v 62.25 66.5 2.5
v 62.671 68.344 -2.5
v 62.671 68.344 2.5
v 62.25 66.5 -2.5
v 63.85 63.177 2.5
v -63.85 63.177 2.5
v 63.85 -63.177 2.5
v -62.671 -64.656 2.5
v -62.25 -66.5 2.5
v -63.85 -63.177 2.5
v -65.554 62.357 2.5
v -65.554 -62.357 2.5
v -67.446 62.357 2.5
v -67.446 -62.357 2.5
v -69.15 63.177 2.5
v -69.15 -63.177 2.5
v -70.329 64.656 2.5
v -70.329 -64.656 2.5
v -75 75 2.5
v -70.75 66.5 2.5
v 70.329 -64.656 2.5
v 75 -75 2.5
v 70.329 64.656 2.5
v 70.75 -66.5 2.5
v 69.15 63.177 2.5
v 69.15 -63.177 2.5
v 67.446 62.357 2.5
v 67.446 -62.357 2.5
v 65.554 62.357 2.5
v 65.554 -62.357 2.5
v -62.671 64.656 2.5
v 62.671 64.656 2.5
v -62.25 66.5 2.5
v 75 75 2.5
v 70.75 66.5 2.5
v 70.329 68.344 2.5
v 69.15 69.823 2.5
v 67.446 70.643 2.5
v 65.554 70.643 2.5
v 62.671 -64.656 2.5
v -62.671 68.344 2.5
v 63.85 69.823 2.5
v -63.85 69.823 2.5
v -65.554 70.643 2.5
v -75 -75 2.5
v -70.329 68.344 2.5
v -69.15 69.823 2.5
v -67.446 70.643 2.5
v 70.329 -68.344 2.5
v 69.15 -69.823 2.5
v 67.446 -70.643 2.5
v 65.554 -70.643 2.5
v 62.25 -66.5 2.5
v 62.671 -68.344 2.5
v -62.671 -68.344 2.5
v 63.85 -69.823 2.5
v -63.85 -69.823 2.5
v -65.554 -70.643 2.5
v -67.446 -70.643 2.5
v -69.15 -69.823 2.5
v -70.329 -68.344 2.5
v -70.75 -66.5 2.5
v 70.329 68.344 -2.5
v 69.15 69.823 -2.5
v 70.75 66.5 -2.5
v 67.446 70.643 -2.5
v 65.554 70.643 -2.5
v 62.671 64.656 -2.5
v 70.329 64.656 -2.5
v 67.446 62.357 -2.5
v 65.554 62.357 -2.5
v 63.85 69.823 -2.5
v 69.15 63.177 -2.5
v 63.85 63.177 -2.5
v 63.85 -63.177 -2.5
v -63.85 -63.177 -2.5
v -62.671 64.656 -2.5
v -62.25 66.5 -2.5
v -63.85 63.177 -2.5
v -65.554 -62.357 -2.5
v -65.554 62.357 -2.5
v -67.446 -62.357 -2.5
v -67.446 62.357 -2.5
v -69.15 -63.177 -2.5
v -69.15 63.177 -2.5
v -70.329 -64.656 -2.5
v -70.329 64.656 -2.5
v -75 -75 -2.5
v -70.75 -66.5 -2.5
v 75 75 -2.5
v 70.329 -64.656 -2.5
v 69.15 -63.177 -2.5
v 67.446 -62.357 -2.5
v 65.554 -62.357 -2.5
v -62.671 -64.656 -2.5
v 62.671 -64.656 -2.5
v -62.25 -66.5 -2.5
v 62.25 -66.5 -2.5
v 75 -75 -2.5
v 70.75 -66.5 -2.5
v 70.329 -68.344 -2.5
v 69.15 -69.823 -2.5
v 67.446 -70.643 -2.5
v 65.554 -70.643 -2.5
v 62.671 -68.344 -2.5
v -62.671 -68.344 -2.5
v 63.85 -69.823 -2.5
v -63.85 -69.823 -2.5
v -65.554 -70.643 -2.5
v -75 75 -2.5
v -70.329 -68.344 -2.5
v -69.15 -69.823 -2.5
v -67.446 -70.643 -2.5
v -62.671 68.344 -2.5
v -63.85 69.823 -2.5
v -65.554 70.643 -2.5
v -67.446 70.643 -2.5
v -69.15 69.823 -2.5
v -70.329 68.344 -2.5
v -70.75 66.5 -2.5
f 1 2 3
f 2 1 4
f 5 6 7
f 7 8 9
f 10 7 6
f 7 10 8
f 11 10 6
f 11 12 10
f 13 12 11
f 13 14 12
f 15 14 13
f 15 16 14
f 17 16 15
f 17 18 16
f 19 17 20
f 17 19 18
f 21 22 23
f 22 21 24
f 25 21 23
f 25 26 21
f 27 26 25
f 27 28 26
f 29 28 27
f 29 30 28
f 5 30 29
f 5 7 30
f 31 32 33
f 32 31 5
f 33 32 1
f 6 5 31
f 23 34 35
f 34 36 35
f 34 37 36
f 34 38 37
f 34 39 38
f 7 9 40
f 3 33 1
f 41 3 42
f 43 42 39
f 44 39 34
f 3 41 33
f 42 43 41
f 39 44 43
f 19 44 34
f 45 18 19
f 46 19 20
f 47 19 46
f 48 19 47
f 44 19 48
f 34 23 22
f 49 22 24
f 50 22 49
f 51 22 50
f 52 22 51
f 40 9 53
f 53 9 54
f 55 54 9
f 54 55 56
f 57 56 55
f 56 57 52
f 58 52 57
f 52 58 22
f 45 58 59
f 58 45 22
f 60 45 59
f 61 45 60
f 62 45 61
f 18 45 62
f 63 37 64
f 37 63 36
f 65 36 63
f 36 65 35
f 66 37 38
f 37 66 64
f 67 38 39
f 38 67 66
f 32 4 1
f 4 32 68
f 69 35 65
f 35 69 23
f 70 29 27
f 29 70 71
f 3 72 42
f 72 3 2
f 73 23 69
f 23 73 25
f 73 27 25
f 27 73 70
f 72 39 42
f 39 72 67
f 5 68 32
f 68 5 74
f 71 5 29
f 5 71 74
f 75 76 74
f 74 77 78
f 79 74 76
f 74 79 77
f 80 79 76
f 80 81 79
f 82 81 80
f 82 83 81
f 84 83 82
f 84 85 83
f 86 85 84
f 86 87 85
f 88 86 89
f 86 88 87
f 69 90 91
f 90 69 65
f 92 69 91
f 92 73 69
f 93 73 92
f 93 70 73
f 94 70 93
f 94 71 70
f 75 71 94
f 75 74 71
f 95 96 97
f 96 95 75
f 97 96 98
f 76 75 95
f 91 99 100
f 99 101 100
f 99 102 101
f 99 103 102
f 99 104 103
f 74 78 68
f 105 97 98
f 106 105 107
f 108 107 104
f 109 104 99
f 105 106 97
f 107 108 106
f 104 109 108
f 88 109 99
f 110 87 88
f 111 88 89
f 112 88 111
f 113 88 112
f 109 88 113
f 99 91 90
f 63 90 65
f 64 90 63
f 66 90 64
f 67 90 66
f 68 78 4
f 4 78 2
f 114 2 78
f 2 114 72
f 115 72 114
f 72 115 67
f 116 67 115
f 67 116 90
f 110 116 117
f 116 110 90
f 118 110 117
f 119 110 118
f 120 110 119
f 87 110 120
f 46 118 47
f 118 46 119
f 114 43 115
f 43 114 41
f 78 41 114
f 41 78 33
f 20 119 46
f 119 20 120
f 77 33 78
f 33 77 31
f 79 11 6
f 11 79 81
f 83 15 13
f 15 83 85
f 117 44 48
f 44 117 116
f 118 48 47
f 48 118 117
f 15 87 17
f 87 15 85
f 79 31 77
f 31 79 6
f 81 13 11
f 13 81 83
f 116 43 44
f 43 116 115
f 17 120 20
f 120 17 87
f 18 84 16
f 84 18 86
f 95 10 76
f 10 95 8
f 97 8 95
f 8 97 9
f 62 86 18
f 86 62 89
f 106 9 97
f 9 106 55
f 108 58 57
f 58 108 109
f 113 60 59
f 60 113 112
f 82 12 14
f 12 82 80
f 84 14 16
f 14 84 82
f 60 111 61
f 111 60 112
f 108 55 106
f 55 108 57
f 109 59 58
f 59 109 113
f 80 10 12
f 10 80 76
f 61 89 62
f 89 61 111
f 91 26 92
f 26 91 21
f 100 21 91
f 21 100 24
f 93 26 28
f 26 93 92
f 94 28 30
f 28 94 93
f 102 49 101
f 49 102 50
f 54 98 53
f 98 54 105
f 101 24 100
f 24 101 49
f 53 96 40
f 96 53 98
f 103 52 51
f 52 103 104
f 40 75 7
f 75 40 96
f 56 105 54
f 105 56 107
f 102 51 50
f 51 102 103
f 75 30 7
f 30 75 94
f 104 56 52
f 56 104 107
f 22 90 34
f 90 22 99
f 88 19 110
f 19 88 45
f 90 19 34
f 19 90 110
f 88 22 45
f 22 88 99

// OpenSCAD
// Generated by SolidPython 1.1.3 on 2023-10-16 12:13:29


difference() {
	cube(center = true, size = [150, 150, 5]);
	union() {
		translate(v = [66.5000000000, 66.5000000000]) {
			cylinder(center = true, h = 5, r = 4.2500000000);
		}
		translate(v = [-66.5000000000, 66.5000000000]) {
			cylinder(center = true, h = 5, r = 4.2500000000);
		}
		translate(v = [-66.5000000000, -66.5000000000]) {
			cylinder(center = true, h = 5, r = 4.2500000000);
		}
		translate(v = [66.5000000000, -66.5000000000]) {
			cylinder(center = true, h = 5, r = 4.2500000000);
		}
	}
}
/***********************************************
*********      SolidPython code:      **********
************************************************
 
import solid
import numbers
import pudb
from solid.utils import *
import viewscad
import subprocess
import os
import os.path as osp
import math
import sys

chamfer_extrude=solid.import_scad("./chamfer_extrude.scad")
chamfer_extrude=chamfer_extrude.chamfer_extrude
r = viewscad.Renderer(width=800, height=800)

def debug(model,f_name,path="/home/ts/code/projects/mfd/designs/debug"):
    solid.scad_render_to_file(model,osp.join(path,f_name)+".scad")
#generate position list of wells using offset from center
wells_pos_from_center_4 = lambda offset: [[-offset,offset],
                                        [offset, offset],
                                        [-offset, -offset],
                                        [offset, -offset]]
#wells_pos_from_center_2 = lambda offset: [[0,offset],
#                                        [0, -offset]]
wells_pos_from_center_2 = lambda offset: [[offset,0],
                                        [-offset,0]]

def make_well(dims,shape=None,height=None,dxf=False):
    def circle_cylinder():
        if dxf or (height is None):
            well = solid.circle(r=dims, segments=64)
        else:
            well = solid.cylinder(r=dims, h=height, segments=64, center = True)
        return well
    if dims is None:
        sys.exit("radius needs to be a number")
    if isinstance(dims, numbers.Number):
        well =circle_cylinder()
    elif len(dims)==1:
        if isinstance(dims[1], numbers.Number):
            well =circle_cylinder()
        else:
            sys.exit("radius needs to be a number")
    elif len(dims)==2:
        well = solid.square(dims,center = True)
    elif len(dims)==3:
        well = solid.cube(dims, center = True)
    return well

def wells_top_bottom(center_gap,device_dims=None,shape=None,height=None, positions = None, dxf = False):
    well_shape = make_well(device_dims,shape=shape,height=height,dxf=dxf)
    wells = []
    if positions is None:
        offset = radius+radius/2.0
        positions = wells_pos_from_center_2(offset)
    if dxf or (height is None):
        height = 0
    for position in positions:
        if dxf:
            wells.append(solid.translate([position[0],position[1]])(well_shape))
        else:
            wells.append(solid.translate([position[0],position[1],height/2.0])(well_shape))
    return  union()(*wells)

#place wells in four corners 
def four_corner(radius,height=None, positions = None, dxf = False):
    #if well pos not specified set
    #to equally spaced by half radius
    if positions is None:
        offset = radius+radius/2.0
        positions = wells_pos_from_center_4(offset)
    if dxf or (height is None):
        height = 0
    #make wells at positions with specified radius and height
    wells = []
    for position in positions:
        #make circle if making dxf
        if dxf:
            well_shape = solid.circle(r=radius, segments=64)
            well_shape = solid.translate([position[0],position[1]])(well_shape)
        #if stl make cylinder
        else:
            well_shape = solid.cylinder(r=radius, h=height, segments=64, center = True)
            well_shape = solid.translate([position[0],position[1],height/2.0])(well_shape)
        wells.append(well_shape)
    return  union()(*wells)

#generate channels 
def make_channels(length,width,height=0,num_chans=1,max_chans=None,spacing=None, dxf = False,
                  rotate_channels=False):
    if dxf or (height is None):
        height = 0
    #if channel gap not defined, is equal to
    if spacing is None: spacing = width
    #calculate number of channels if fitting max num within given width
    if not max_chans is None:
        import math
        num_chans = math.floor((max_chans-spacing)/(width+spacing))
    #get total width of channel section  
    total_width = (width*num_chans)+(spacing*(num_chans-1))

    #make template channel
    #if rotate_channels: width, length = length, width
    if dxf:
        channel_t = solid.square([length,width],center = True)
    else:
        channel_t = solid.cube([length,width,height], center = True)

    #if number channels is even, offset the first channel to center its gap
    if num_chans % 2 == 0: centering = -(width/2.0+spacing/2.0)
    else: centering = 0
    #move template channel up to align bottom at z = 0 
    #and offset center if necessary
    if dxf:
        channel_t = solid.translate([0,centering])(channel_t)
    else:
        channel_t = solid.translate([0,centering,height/2.0])(channel_t)

    #if rotate_channels: length,width = width,length
    #start making the channels
    channels = []
    for i in range(num_chans):
        #if i=0 there is no translation
        #if i=1, we make the first channel adjacent to second
        direction = i

        #if i>=1, we add channels alternating left and right
        if i >= 1:
            direction = -(i/2.0)
            if i % 2 == 1: direction = (-direction)+0.5
                
        #make channel at right position and add it to channel list
        translation_coords = [0,direction*(width+spacing)]
        #if rotate_channels: translation_coords = [direction*(width+spacing),0]
        if dxf:
            channel = solid.translate(translation_coords)(channel_t)
        else:
            channel = solid.translate([*translation_coords,0])(channel_t)
        channels.append(channel)
    
    #group all channels as one object
    channels = union()(*channels)
    #compute the x,y,z dimensions in order to pass as arguments 
    #for construction of other parts of device (such as the chambers)
    measurements = {'x':(length/2.0,-length/2.0),
                    'y':(total_width/2.0,-total_width/2.0)}
    if not dxf:
        measurements['z'] = (height,0)
    if rotate_channels:
        channels = solid.rotate(90)(channels)
        measurements['x'],measurements['y']=measurements['y'],measurements['x']
    return channels,measurements

def make_chambers(msrs,height=None,extra=0,len_until=None,width=None, dxf = False):
    #computes x,y,z length
    total = lambda x : abs(x[0]) + abs(x[1])
    
    #if specific height if specified
    #otherwise use same height as channels
    if dxf:
        pass
    elif not height is None:
        msrs['z'] = (height,0)
    else:
        msrs['z'] = (0,0)
        
    #make copy of measurements from channels to modify chamber dimensions 
    #and add length to chambers as specified
    chamber_dims = msrs.copy()
    #calculate length of chamber to reach specified offset
    if not len_until is None:
        chamber_len = len_until-(msrs['x'][0])
    #or add specified length to channel length (if not specified, adds 0)
    else:
        chamber_len = msrs['x'][0]+extra
    #set the chamber length based 
    chamber_dims['x'] = (chamber_len/2.0,-(chamber_len/2.0))
    #compute final dimensions of chamber
    if not width is None:
        chamber_dims['y'] = (width/2.0,-width/2.0)
    chamber_dims = [total(size) for size in chamber_dims.values()]
        
    #calculate chamber translation offset to place adjacent to channels
    chamber_trslt = msrs['x'][0]+(chamber_len/2.0)
    #compute chamber translation coordinates to align with channels
    #x = 1 moves chamber above channels
    #x = -1 moves chamber below channels
    if dxf:
        trslt = lambda x : [x*(chamber_trslt),0]
    else:
        trslt = lambda x : [x*(chamber_trslt),0,msrs['z'][0]/2.0]
    
    #function to make chamber at top or at bottom 
    if dxf:
        move = lambda x : solid.translate(trslt(x))(solid.square(chamber_dims, center = True) )
    else:
        move = lambda x : solid.translate(trslt(x))(solid.cube(chamber_dims,center = True))
    #make top and bottom chambers and return them as grouped
    top = move(1)
    bottom = move(-1)
    #chambers=solid.rotate(90)(solid.union()(top,bottom))
    chambers=(solid.union()(top,bottom))

    return chambers

#create alignment features 
def alignment_features(unit,dims,grid_size, mask_size = None, alignment = "hollow", units_from_center = (2.5,2.5), corner_len=None):
    width = grid_size[0]*dims[0]
    length = grid_size[1]*dims[1]
    if mask_size is None and corner_len is None:
        corner_len = (dims[0] + dims[1]) /2 / 8
    corner = lambda thickness_div : solid.union()( solid.square([corner_len,corner_len/thickness_div],center=False), solid.square([corner_len/thickness_div,corner_len],center=False) )
    
    def make_full(thickness_div):
        thickness = corner_len/thickness_div
        tr = solid.translate([0, 0, 0 ])(solid.rotate(180)(corner(thickness_div)))
        tr = solid.translate([thickness/2,thickness/2,0])(tr)
        bl = solid.translate([0, 0, 0 ])(solid.rotate(0)(corner(thickness_div)))
        bl = solid.translate([-thickness/2,-thickness/2,0])(bl)
        return solid.union()(tr,bl)
    
    def make_hollow(thickness_div):
        thickness = corner_len/(thickness_div/2)
        inner = make_full(thickness_div)
        outer = make_full(thickness_div/2)
        hollow = outer - inner 
        return hollow
    
    center = (width /2 , length/2)
    mask_pos = lambda x,y : (center[0] + x*(float(units_from_center[0])*dims[0]), center[1] + y*(float(units_from_center[1])*dims[1]))
    positions = []
    positions.append(mask_pos(1,0))
    positions.append(mask_pos(0,1))
    positions.append(mask_pos(-1,0))
    positions.append(mask_pos(0,-1))
    make_mask = lambda mtype : make_hollow(8) if mtype == "hollow" else make_full(8)
    masks = [ solid.translate([*position,0])(make_mask(alignment)) for position in positions]
    
    solid.scad_render_to_file(solid.union()(*masks),"./designs/open_chamber/masks.scad")
    #return unit - solid.union()(*masks)
    return solid.union()(*masks,unit)

def create_outline(thickness, array, dims, grid_size,):
    width = grid_size[0]*dims[0] + thickness *2
    length = grid_size[1]*dims[1] + thickness *2
    outer = solid.translate([-thickness, -thickness,0])(solid.square([width, length]))
    return outer-array

def create_wall(wall_thickness, outline_thickness, dims, grid_size, wall_height = 2000, dxf = False):
    inner_width = grid_size[0]*dims[0] + outline_thickness *2
    inner_length = grid_size[1]*dims[1] + outline_thickness *2
    outer_width = inner_width + wall_thickness * 2
    outer_length = inner_length + wall_thickness * 2
    outer_pos_x = -outline_thickness-wall_thickness
    outer_pos_y = -outline_thickness-wall_thickness
    inner_pos_x = -outline_thickness
    inner_pos_y = -outline_thickness
    if dxf:
        inner_wall = solid.translate([inner_pos_x,
                                      inner_pos_y,
                                      0])(solid.square([inner_width, inner_length]))
        outer_wall = solid.translate([outer_pos_x,
                                      outer_pos_y,
                                      0])(solid.square([outer_width, outer_length]))

        return outer_wall-inner_wall
    else:
        inner_wall = solid.translate([inner_pos_x,
                                      inner_pos_y,
                                      0])(solid.cube([inner_width, inner_length,wall_height]))
        outer_wall = solid.translate([outer_pos_x,
                                      outer_pos_y,
                                      0])(solid.cube([outer_width, outer_length,wall_height]))

        return outer_wall-inner_wall, {'wall_height': wall_height,
                                       'wall_thickness': wall_thickness,
                                       'inner_width':inner_width,
                                       'inner_length': inner_length,
                                       'outer_width': outer_width,
                                       'outer_length': outer_length,
                                       'outer_pos_x' : outer_pos_x,
                                       'outer_pos_y' : outer_pos_y,
                                       'inner_pos_x' : inner_pos_x,
                                       'inner_pos_y' : inner_pos_y}

def create_thicker_wall(wall_thickness, outer_wall_offset, wall_dims, dims, grid_size, height_start = .2, height_end=2, dxf = False):
    addon_wall,thicker_wall_dims = create_wall(wall_thickness, outer_wall_offset, dims, grid_size, wall_height=height_end-height_start, dxf = False)
    addon_wall = solid.translate([0,0,height_start])(addon_wall)

    thicker_wall_dims['wall_height'] = height_end
    thicker_wall_dims['wall_thickness'] = wall_dims['wall_thickness'] + wall_thickness
    return addon_wall, thicker_wall_dims
 
def add_lock_to_wall(wall,wall_dims,y_offset = 0,cut_ratio=0.7,L_length=3, gap_ratio=0.05, axis="x",width_ratio=1/2):
    # Makes L shape
    def make_L(max_length,length_thickness,max_width,width_thickness,height,y_offset):
        length = solid.cube([max_length,length_thickness,height])
        width = solid.cube([width_thickness,max_width,height])
        width = solid.translate([max_length-(width_thickness),0,0])(width)
        L = solid.union()(width,length)
        debug(L,"L")
        if axis == "x":
            L = solid.rotate(-90)(L)
            L = solid.translate([0,max_length,0])(L)
        else:
            L = solid.rotate(-180)(L)
            L = solid.translate([max_length,max_width,0])(L)
        return solid.translate([0,0,y_offset])(L)
    
    lock_length = L_length
    lock_width = wall_dims['wall_thickness']*width_ratio
    lock_length_thickness = lock_width/2
    lock_width_thickness = lock_width/2
    L_lock = make_L(lock_length,lock_length_thickness,lock_width,lock_width_thickness, wall_dims['wall_height']-y_offset, y_offset)
    
    margin_space = lock_length - lock_length*(1-gap_ratio)
    key_length = lock_length-margin_space
    key_length_thickness = lock_length_thickness-(margin_space*2)
    key_width = lock_width-(margin_space*2)
    key_width_thickness = lock_width_thickness-(margin_space*2)
    L_key = make_L(key_length,key_length_thickness,key_width,key_width_thickness, wall_dims['wall_height']-y_offset, y_offset)
    L_key = solid.translate([margin_space,margin_space,0])(L_key)
    L = solid.union()(L_lock,L_key)
    debug(L,"L")
    
    #Make cube to be used as negative to split frame in a half
    #Can choose if making left or right negative, specify ratio of split
    def make_negative(right,cut_ratio):
        if axis == "x":
            if right:
                length = wall_dims['outer_length']*(1-cut_ratio)
                pos_x = wall_dims['outer_pos_x']+(wall_dims['outer_length']*cut_ratio)
            else:
                length = wall_dims['outer_length']*(cut_ratio)
                pos_x = wall_dims['outer_pos_x'] 
            negative = solid.cube([wall_dims['outer_width'],length, wall_dims['wall_height']])
            negative = solid.translate([wall_dims['outer_pos_y'],pos_x,0])(negative)
        else:
            if right:
                length = wall_dims['outer_width']*(1-cut_ratio)
                pos_x = wall_dims['outer_pos_y']+(wall_dims['outer_width']*cut_ratio)
            else:
                length = wall_dims['outer_width']*(cut_ratio)
                pos_x = wall_dims['outer_pos_y'] 
            negative = solid.cube([length,wall_dims['outer_length'], wall_dims['wall_height']])
            negative = solid.translate([pos_x,wall_dims['outer_pos_x'],0])(negative)
        return negative, pos_x, length 
                      
    #Make negatives
    negative_right, right_half_pos_x, right_half_length = make_negative(True,cut_ratio)
    negative_left, left_half_pos_x, right_half_length = make_negative(False,cut_ratio)
    #Make halves
    left_half = solid.difference()(wall,negative_right)
    right_half = solid.difference()(wall,negative_left)
    def place_L(L, L_length,L_width):
        #Place L on top wall       
        offset_to_center = (wall_dims['wall_thickness']-L_width)/2
        if axis == "x":
            y_pos_top = (wall_dims['outer_pos_y'] +
                    wall_dims['outer_width'] - 
                    L_width - offset_to_center)
            top_L = solid.translate([y_pos_top,
                                     right_half_pos_x-(L_length),
                                     0])(L)
            #Place L on bottom wall       
            y_pos_bottom = wall_dims['outer_pos_y']+offset_to_center
            bottom_L = solid.translate([y_pos_bottom,
                                        right_half_pos_x-L_length,
                                        0])(L)
        else:
            y_pos_top = (wall_dims['outer_pos_x'] +
                    wall_dims['outer_length'] -
                    (L_width+offset_to_center))
            top_L = solid.translate([right_half_pos_x-L_length,
                                     y_pos_top,
                                     0])(L)
            #Place L on bottom wall       
            y_pos_bottom = wall_dims['outer_pos_y']+offset_to_center
            bottom_L = solid.translate([right_half_pos_x-L_length,
                                        y_pos_bottom,
                                        0])(L)
        return bottom_L, top_L
    #Make complimentary L pieces through union and differences
    #Make Lock
    bottom_L_lock, top_L_lock = place_L(L_lock,L_length,lock_width)
    left_half = solid.difference()(left_half,bottom_L_lock)
    left_half = solid.difference()(left_half,top_L_lock)
    #Make Key
    bottom_L_key, top_L_key = place_L(L_key,L_length,lock_width)
    right_half = solid.union()(right_half,bottom_L_key)
    right_half = solid.union()(right_half,top_L_key)
    return left_half, right_half


#build a row x col grid of containment units
def make_unit_array(unit,dims,grid_size, dxf = False, alignment = None, mask_size = None,
                    units_from_center = None,alignment_offset=None, alignment_mark_size=1):
    units = []
    for col in range(grid_size[1]):
        for row in range(grid_size[0]):
            if dxf:
                units.append(solid.translate([row*dims[0],col*dims[1]])(unit))
            else:
                units.append(solid.translate([row*dims[0],col*dims[1],dims[2]/2.0])(unit))
    array = solid.union()(*units)
    if (not alignment is None) and dxf:
        if not alignment_offset is None:
            array = solid.translate([alignment_offset[0],alignment_offset[1]])(array)
        array = alignment_features(array,dims, grid_size, alignment = alignment, mask_size = None, units_from_center = units_from_center,corner_len=alignment_mark_size)
        if not alignment_offset is None:
            array = solid.translate([-alignment_offset[0],-alignment_offset[1]])(array)
    return array


def make_taylor(wells_pos = wells_pos_from_center_4(2.25), well_rad = 1.5 ,
                well_height = 2, chan_w = 0.01, chan_l = 1, chan_h = 0.010 ,
                chan_gap = 0.040, max_chans = None,num_chans=100, chamber_height  = 0.100,
                columns = 1, rows = 1, chamber_len_until=2.25, add_channels = True, add_wells = True, 
                add_chambers = True, save_path = "./", alignment = None, units_from_center = 2,
                mask_size = None, render_stl = False, outline_thickness = 0.050, dxf = True,
                wall_height = 15, wall_thickness = 0.95, casing_x=9, casing_y=9, casing_z=0,rotate_units=0):

    dims = [casing_x, casing_y, casing_z]
    wells = four_corner(well_rad,well_height, dxf = dxf, positions = wells_pos)
    debug(wells,"wells")
    channels, msrs = make_channels(chan_l,chan_w,chan_h,dxf=dxf, spacing = chan_gap, max_chans=max_chans,num_chans=num_chans)
    debug(channels,"channels")
    chambers = make_chambers(msrs,dxf = dxf, height=chamber_height,len_until=chamber_len_until)
    debug(chambers,"chambers")

    #add together and render
    device_parts = []
    if add_channels:
        device_parts.append(channels)
    if add_wells:
        device_parts.append(wells)
    if add_chambers:
        device_parts.append(chambers)
    device=union()(*device_parts)
    device = rotate(rotate_units)(device)

    device=solid.translate([dims[0]/2.0,dims[1]/2.0,0])(device)
    channels = rotate(rotate_units)(channels)
    channels=solid.translate([dims[0]/2,dims[1]/2,0])(channels)
    chambers_wells = union()(wells,chambers)
    chambers_wells = rotate(rotate_units)(chambers_wells)
    chambers_wells=solid.translate([dims[0]/2,dims[1]/2,0])(chambers_wells)

    file_name = str(rows)+'x'+str(columns)+'_units_'
    grid_size = [rows,columns]

    if alignment:
        alignment="full"
    device = make_unit_array(device,dims,grid_size, dxf=dxf, alignment = alignment,
                                 units_from_center = units_from_center)
    channels = make_unit_array(channels,dims,grid_size, dxf=dxf, alignment = alignment,
                                 units_from_center = units_from_center)
    if alignment=="full":
        alignment="hollow"

    chambers_wells = make_unit_array(chambers_wells,dims,grid_size, dxf=dxf, alignment = alignment,
                                 units_from_center =units_from_center)

    def save_model(model,prefix):
        model_fname = os.path.abspath(save_path+prefix+"_"+file_name+".scad")
        solid.scad_render_to_file(model,model_fname)
        return model_fname

    wells_fname = save_model(wells,"wells")
    channels_fname = save_model(channels,"channels")
    device_fname = save_model(device,"device")
    chambers_wells_fname = save_model(chambers_wells,"chambers_wells")
    return (chambers_wells,chambers_wells_fname), (channels,channels_fname), (device,device_fname)

def make_device(design='open',rows=8,columns=6,wells_pos = 4.5,well_offset=3.2, well_rad=3.2,well_height=0.1,
                chan_l=1,chan_w=0.01,chan_h=0.01,chan_gap=0.015,num_chans=101,dxf=True,save_path="./designs/open_chamber/",
                casing_x=9.0,casing_y=18.0,casing_z=0,rotate_units=90,units_from_center=(3,1),chamber_len_until=4.5,
                chamber_width=None,alignment=True, add_wells=True, add_channels=True,add_chambers=True):

    dims = [casing_x, casing_y, casing_z]
    if design == "open":
        wells_pos=wells_pos_from_center_2(wells_pos)
        wells = wells_top_bottom(well_offset*2,device_dims=well_rad,height=well_height, dxf = dxf, positions = wells_pos)
    elif design == "closed":
        wells_pos=wells_pos_from_center_4(wells_pos)
        debug(wells,"wells")
        wells = four_corner(well_offset,well_heightdevice_dims=well_rad, dxf = dxf, positions = wells_pos)
    else:
        print(design+" is not a valid design.\n Choose valid design: 'open' or 'closed'")
        exit()
    wells = rotate(rotate_units)(wells)
    wells=solid.translate([dims[0]/2,dims[1]/2,0])(wells)
    debug(wells,"wells")

    channels, msrs = make_channels(chan_l,chan_w,chan_h,dxf=dxf, spacing = chan_gap, num_chans=num_chans,rotate_channels=False)
    channels = rotate(rotate_units)(channels)
    channels=solid.translate([dims[0]/2,dims[1]/2,0])(channels)

    chambers=make_chambers(msrs,height=None,extra=0,len_until=chamber_len_until, width=chamber_width,dxf = dxf)
    chambers = rotate(rotate_units)(chambers)
    chambers=solid.translate([dims[0]/2,dims[1]/2,0])(chambers)

    device_parts = []
    if add_channels:
        device_parts.append(channels)
    if add_wells:
        device_parts.append(wells)
    if add_chambers:
        device_parts.append(chambers)
    device = union()(*device_parts)
    #device = rotate(rotate_units)(device)
    #device=solid.translate([dims[0]/2.0,dims[1]/2.0,0])(device)

    chambers_wells = []
    if add_chambers:
        chambers_wells.append(chambers)
    if add_wells:
        chambers_wells.append(wells)
    chambers_wells = union()(*chambers_wells)
    #chambers_wells = union()(wells,chambers)
    #chambers_wells = rotate(rotate_units)(chambers_wells)
    #chambers_wells=solid.translate([dims[0]/2,dims[1]/2,0])(chambers_wells)

    file_name = str(rows)+'x'+str(columns)+'_units_'

    grid_size = [rows,columns]
    if alignment:
        alignment="full"
    device = make_unit_array(device,dims,grid_size, dxf=dxf, alignment = alignment,
                                 units_from_center = units_from_center)
    channels = make_unit_array(channels,dims,grid_size, dxf=dxf, alignment = alignment,
                                 units_from_center = units_from_center)
    if alignment=="full":
        alignment="hollow"

    chambers_wells = make_unit_array(chambers_wells,dims,grid_size, dxf=dxf, alignment = alignment,
                                 units_from_center =units_from_center)

    def save_model(model,prefix):
        model_fname = os.path.abspath(save_path+prefix+"_"+file_name+".scad")
        solid.scad_render_to_file(model,model_fname)
        return model_fname

    wells_fname = save_model(wells,"wells")
    channels_fname = save_model(channels,"channels")
    device_fname = save_model(device,"device")
    chambers_wells_fname = save_model(chambers_wells,"chambers_wells")
    return (chambers_wells,chambers_wells_fname), (channels,channels_fname), (device,device_fname)


def make_open_chamber(rows=8,columns=6,wells_pos = wells_pos_from_center_2(4.5), well_rad=3.2,well_height=0.1,
                      chan_l=1,chan_w=0.01,chan_h=0.01,chan_gap=0.015,num_chans=101,dxf=True,save_path="./designs/open_chamber/",
                      casing_x=9.0,casing_y=18.0,casing_z=0,rotate_units=90,units_from_center=(3,1),chamber_len_until=4.5,
                      chamber_width=None,alignment=True, add_wells=True, add_channels=True,add_chambers=True):

    dims = [casing_x, casing_y, casing_z]
    wells = wells_top_bottom(well_rad,height=well_height, dxf = dxf, positions = wells_pos)
    channels, msrs = make_channels(chan_l,chan_w,chan_h,dxf=dxf, spacing = chan_gap, num_chans=num_chans,rotate_channels=False)
    chambers=make_chambers(msrs,height=None,extra=0,len_until=chamber_len_until, width=chamber_width,dxf = dxf)
    debug(chambers,"chambers")
    device_parts = []
    if add_channels:
        device_parts.append(channels)
    if add_wells:
        device_parts.append(wells)
    if add_chambers:
        device_parts.append(chambers)
    device = union()(*device_parts)
    device = rotate(rotate_units)(device)
    device=solid.translate([dims[0]/2.0,dims[1]/2.0,0])(device)
    channels = rotate(rotate_units)(channels)
    channels=solid.translate([dims[0]/2,dims[1]/2,0])(channels)
    chambers_wells = union()(wells,chambers)
    chambers_wells = rotate(rotate_units)(chambers_wells)
    chambers_wells=solid.translate([dims[0]/2,dims[1]/2,0])(chambers_wells)

    file_name = str(rows)+'x'+str(columns)+'_units_'

    grid_size = [rows,columns]
    if alignment:
        alignment="full"
    device = make_unit_array(device,dims,grid_size, dxf=dxf, alignment = alignment,
                                 units_from_center = units_from_center)
    channels = make_unit_array(channels,dims,grid_size, dxf=dxf, alignment = alignment,
                                 units_from_center = units_from_center)
    if alignment=="full":
        alignment="hollow"

    chambers_wells = make_unit_array(chambers_wells,dims,grid_size, dxf=dxf, alignment = alignment,
                                 units_from_center =units_from_center)

    def save_model(model,prefix):
        model_fname = os.path.abspath(save_path+prefix+"_"+file_name+".scad")
        solid.scad_render_to_file(model,model_fname)
        return model_fname

    wells_fname = save_model(wells,"wells")
    channels_fname = save_model(channels,"channels")
    device_fname = save_model(device,"device")
    chambers_wells_fname = save_model(chambers_wells,"chambers_wells")
    return (chambers_wells,chambers_wells_fname), (channels,channels_fname), (device,device_fname)

def to_dxf(scad_path):
    dxf_path = scad_path.replace(".scad",".dxf")
    subprocess.call(["openscad", "-o", dxf_path, scad_path])
    import ezdxf
    temp_dxf = ezdxf.readfile(dxf_path)
    temp_dxf.saveas(dxf_path)

#def make_walls(diameter,thickness,grid_size,dims,height=20,segments=256,make_inner=True):
#    wafer_wall_out = solid.cylinder(r=diameter/2,h=height, segments=segments)
#    wafer_wall_in = solid.cylinder(r=(diameter/2-thickness),h=height, segments=segments)
#    wafer_wall = solid.difference()(wafer_wall_out,wafer_wall_in)
#    wafer_wall = solid.translate([grid_size[1]*dims[1]/2.0,grid_size[0]*dims[0]/2.0])(wafer_wall)
#
#    vertical_wall_length = grid_size[1]*dims[1]
#    horizontal_wall_length = grid_size[0]*dims[0]
#    vertical_wall = solid.cube([vertical_wall_length,thickness,height],center = True)
#    vertical_wall = solid.translate([vertical_wall_length/2,0,height/2])(vertical_wall)
#    horizontal_wall = solid.cube([thickness,horizontal_wall_length,height],center = True)
#    horizontal_wall = solid.translate([0,vertical_wall_length/2,height/2])(horizontal_wall)
#    walls = []
#    walls.append(horizontal_wall)
#    walls.append(vertical_wall)
#    for col in range(grid_size[1]):
#        if col == grid_size[1]-1: 
#            walls.append(solid.translate([0,(col+1)*dims[1]])(vertical_wall))
#        elif col > 0 and col < grid_size[1]-1 and make_inner==True:
#            walls.append(solid.translate([0,(col+1)*dims[1]])(vertical_wall))
#    for row in range(grid_size[0]):
#        if row == grid_size[0]-1: 
#            walls.append(solid.translate([(row+1)*dims[0],0])(horizontal_wall))
#        elif row > 0 and row < grid_size[0]-1 and make_inner==True:
#            walls.append(solid.translate([(row+1)*dims[0],0])(horizontal_wall))
#    walls = union()(*walls)
#    wafer_walls = union()(walls,wafer_wall)
#    return walls,wafer_wall,wafer_walls

def make_walls(diameter,thickness,grid_size,dims,height=20,segments=256,make_inner=True,padx=0,pady=0):
    wafer_wall_out = solid.cylinder(r=diameter/2,h=height, segments=segments)
    wafer_wall_in = solid.cylinder(r=(diameter/2-thickness),h=height, segments=segments)
    wafer_wall = solid.difference()(wafer_wall_out,wafer_wall_in)
    wafer_wall = solid.translate([grid_size[1]*dims[1]/2.0,grid_size[0]*dims[0]/2.0])(wafer_wall)

    vertical_wall_length = grid_size[0]*dims[0]+padx
    horizontal_wall_length = grid_size[1]*dims[1]+pady
    vertical_wall = solid.cube([vertical_wall_length,thickness,height],center = True)
    vertical_wall = solid.translate([vertical_wall_length/2-pady/2,-padx/2,height/2])(vertical_wall)
    horizontal_wall = solid.cube([thickness,horizontal_wall_length,height],center = True)
    horizontal_wall = solid.translate([-pady/2,horizontal_wall_length/2-padx/2,height/2])(horizontal_wall)
    walls = []
    walls.append(horizontal_wall)
    walls.append(vertical_wall)
    for col in range(grid_size[1]):
        if col == grid_size[1]-1: 
            walls.append(solid.translate([0,(col+1)*dims[1]+pady])(vertical_wall))
        elif col > 0 and col < grid_size[1]-1 and make_inner==True:
            walls.append(solid.translate([0,(col+1)*dims[1]])(vertical_wall))
    for row in range(grid_size[0]):
        if row == grid_size[0]-1: 
            walls.append(solid.translate([(row+1)*dims[0]+padx,0])(horizontal_wall))
        elif row > 0 and row < grid_size[0]-1 and make_inner==True:
            walls.append(solid.translate([(row+1)*dims[0],0])(horizontal_wall))
    walls = union()(*walls)
    wafer_walls = union()(walls,wafer_wall)
    return walls,wafer_wall,wafer_walls

def save_model(model,base_path,base_name,dxf=True):
    if not os.path.exists(base_path):
        os.makedirs(base_path)
    dxf_path=osp.join(base_path,base_name+".scad")
    solid.scad_render_to_file(model,osp.join(dxf_path))
    if dxf:
        to_dxf(dxf_path)

def make_wafer(diameter,flat_len,thickness):
    wafer = solid.cylinder(r1=diameter/2,r2=diameter/2,h=thickness,segments=512,)()
    x_start_flat=(flat_len/2)
    y_start_flat = math.sqrt(((diameter/2)**2) - (x_start_flat**2) )
    height_delete_flat=diameter/2-y_start_flat
    flat_delete = solid.cube([flat_len,height_delete_flat,thickness],center=False)()
    flat_delete = solid.translate([-flat_len/2,y_start_flat,0])(flat_delete)
    wafer = solid.difference()(wafer,flat_delete)
    wafer = solid.rotate(90)(wafer)
    return wafer

def add_wafer_to_mask(wafer_size,flat_len,mask,grid_size,dims,wafer_line_thickness=0.1,outer_mask_thickness=5,alignment_offset=None):
    def make_wafer_mask(wafer_size,flat_len):
        wafer_mask = make_wafer(wafer_size,flat_len,1)
        wafer_mask = solid.projection()(wafer_mask)
        wafer_mask = solid.translate([grid_size[0]*dims[0]/2.0,grid_size[1]*dims[1]/2.0])(wafer_mask)
        if not alignment_offset is None:
            wafer_mask = solid.translate([-alignment_offset[0],-alignment_offset[1]])(wafer_mask)
        return wafer_mask

    inner_wafer_line_mask = make_wafer_mask(wafer_size-wafer_line_thickness/2,flat_len)
    outer_wafer_line_mask = make_wafer_mask(wafer_size+wafer_line_thickness/2,flat_len)
    outer_wafer_mask = make_wafer_mask(wafer_size+outer_mask_thickness,flat_len)
    outer_wafer_mask = solid.difference()(outer_wafer_mask,outer_wafer_line_mask)
    wafer_mask = solid.union()(outer_wafer_mask,inner_wafer_line_mask)

    return solid.difference()(wafer_mask,mask)

def make_posts(post_shape,post_height):
    posts = solid.linear_extrude(height=post_height)(post_shape)
    return posts

def make_wafer_empty(diameter,flat_len,thickness,margin,notch_len=20,notch_height=5,oversize=1.01):
    diameter*=oversize
    flat_len*=oversize
    wafer = make_wafer(diameter,flat_len,thickness)
    holder = solid.cylinder(r1=diameter/2+margin,r2=diameter/2+margin,h=thickness,segments=512)()
    holder = solid.difference()(holder,wafer)

    x_start_flat=(flat_len/2)
    y_start_flat = math.sqrt(((diameter/2)**2) - (x_start_flat**2) )
    height_delete_flat=diameter/2-y_start_flat
    notch = solid.cube([notch_len,notch_height,thickness],center=False)()
    notch = solid.translate([-notch_len/2,y_start_flat,0])(notch)
    notch = solid.rotate(90)(notch)
    return solid.difference()(holder,notch)

def wafer_print_calibration(diameter,thickness,height,z_offset):
    circles = []
    radii = []
    radii.append(diameter/2.0*0.8)
    radii.append(diameter/2.0*0.6)
    radii.append(diameter/2.0*0.4)
    radii.append(diameter/2.0*0.2)
    for radius in radii:
        inner = solid.cylinder(r1=radius-(thickness/2.0),r2=radius-(thickness/2.0),h=thickness,segments=512,)()
        outer = solid.cylinder(r1=radius+(thickness/2.0),r2=radius+(thickness/2.0),h=thickness,segments=512,)()
        diff = solid.difference()(outer,inner)
        circles.append(diff)
    circles = solid.union()(*circles)
    circles = solid.translate([0,0,z_offset])(circles)
    return circles

def make_rack(wells,dims,grid_size,alignment_offset,rack_x,rack_y,rack_thickness,bolt_width,add_bolts=True):

    #get X and Y dimensions of gride of pipette tips
    X_len = dims[0]*grid_size[0]
    Y_len = dims[1]*grid_size[1]
    #make rack
    rack = solid.cube([rack_x,rack_y,rack_thickness],center=True)

    if add_bolts:
    #add bolt holes
        bolt_hole=solid.cylinder(r=bolt_width/2,h=rack_thickness,center=True)()
        bolt_holes = []
        bolt_holes.append(solid.translate([rack_x/2-1.5*bolt_width,rack_y/2-1.5*bolt_width])(bolt_hole))
        bolt_holes.append(solid.translate([-rack_x/2+1.5*bolt_width,rack_y/2-1.5*bolt_width])(bolt_hole))
        bolt_holes.append(solid.translate([-rack_x/2+1.5*bolt_width,-rack_y/2+1.5*bolt_width])(bolt_hole))
        bolt_holes.append(solid.translate([rack_x/2-1.5*bolt_width,-rack_y/2+1.5*bolt_width])(bolt_hole))
        bolt_holes = solid.union()(*bolt_holes)
        rack=solid.difference()(rack,bolt_holes)
    rack_support = rack

    #center rack with pipette holes
    rack = solid.translate([0,0,rack_thickness/2])(rack)
    rack = solid.translate([X_len/2,Y_len/2])(rack)
    rack = solid.translate([-alignment_offset[0],-alignment_offset[1]])(rack)
    wells = solid.linear_extrude(height=rack_thickness)(wells)
    rack = solid.difference()(rack,wells)
    return rack, rack_support

def make_pillar(wells,dims,grid_size,alignment_offset,rack_x,rack_y,pillar_height,rack_thickness,bolt_width,add_bolts=True,taper_angle=1,bolt_position_corner=1.5):

    #get X and Y dimensions of gride of pipette tips
    X_len = dims[0]*grid_size[0]
    Y_len = dims[1]*grid_size[1]
    #make rack
    rack = solid.cube([rack_x,rack_y,rack_thickness],center=True)
    
    if add_bolts:
    #add bolt holes
        bolt_hole=solid.cylinder(r=bolt_width/2,h=rack_thickness,center=True)()
        bolt_holes = []
        bolt_holes.append(solid.translate([rack_x/2-bolt_position_corner*bolt_width,rack_y/2-bolt_position_corner*bolt_width])(bolt_hole))
        bolt_holes.append(solid.translate([-rack_x/2+bolt_position_corner*bolt_width,rack_y/2-bolt_position_corner*bolt_width])(bolt_hole))
        bolt_holes.append(solid.translate([-rack_x/2+bolt_position_corner*bolt_width,-rack_y/2+bolt_position_corner*bolt_width])(bolt_hole))
        bolt_holes.append(solid.translate([rack_x/2-bolt_position_corner*bolt_width,-rack_y/2+bolt_position_corner*bolt_width])(bolt_hole))
        bolt_holes = solid.union()(*bolt_holes)
        rack=solid.difference()(rack,bolt_holes)
    rack_support = rack

    #center rack with pipette holes
    #rack = solid.translate([0,0,-rack_thickness])(rack)
    rack = solid.translate([X_len/2,Y_len/2])(rack)
    rack = solid.translate([-alignment_offset[0],-alignment_offset[1]])(rack)
    if not taper_angle == 0:
        wells=chamfer_extrude(pillar_height,taper_angle,segments=20)(wells)
    else:
        wells = solid.linear_extrude(height=pillar_height)(wells)
    rack = solid.union()(rack,wells)
    return rack, rack_support

def deg_taper_len(height,deg):
    if not deg == 0:
        return height*math.tan(math.radians(deg))
    else:
        return 0









 
 
************************************************/
